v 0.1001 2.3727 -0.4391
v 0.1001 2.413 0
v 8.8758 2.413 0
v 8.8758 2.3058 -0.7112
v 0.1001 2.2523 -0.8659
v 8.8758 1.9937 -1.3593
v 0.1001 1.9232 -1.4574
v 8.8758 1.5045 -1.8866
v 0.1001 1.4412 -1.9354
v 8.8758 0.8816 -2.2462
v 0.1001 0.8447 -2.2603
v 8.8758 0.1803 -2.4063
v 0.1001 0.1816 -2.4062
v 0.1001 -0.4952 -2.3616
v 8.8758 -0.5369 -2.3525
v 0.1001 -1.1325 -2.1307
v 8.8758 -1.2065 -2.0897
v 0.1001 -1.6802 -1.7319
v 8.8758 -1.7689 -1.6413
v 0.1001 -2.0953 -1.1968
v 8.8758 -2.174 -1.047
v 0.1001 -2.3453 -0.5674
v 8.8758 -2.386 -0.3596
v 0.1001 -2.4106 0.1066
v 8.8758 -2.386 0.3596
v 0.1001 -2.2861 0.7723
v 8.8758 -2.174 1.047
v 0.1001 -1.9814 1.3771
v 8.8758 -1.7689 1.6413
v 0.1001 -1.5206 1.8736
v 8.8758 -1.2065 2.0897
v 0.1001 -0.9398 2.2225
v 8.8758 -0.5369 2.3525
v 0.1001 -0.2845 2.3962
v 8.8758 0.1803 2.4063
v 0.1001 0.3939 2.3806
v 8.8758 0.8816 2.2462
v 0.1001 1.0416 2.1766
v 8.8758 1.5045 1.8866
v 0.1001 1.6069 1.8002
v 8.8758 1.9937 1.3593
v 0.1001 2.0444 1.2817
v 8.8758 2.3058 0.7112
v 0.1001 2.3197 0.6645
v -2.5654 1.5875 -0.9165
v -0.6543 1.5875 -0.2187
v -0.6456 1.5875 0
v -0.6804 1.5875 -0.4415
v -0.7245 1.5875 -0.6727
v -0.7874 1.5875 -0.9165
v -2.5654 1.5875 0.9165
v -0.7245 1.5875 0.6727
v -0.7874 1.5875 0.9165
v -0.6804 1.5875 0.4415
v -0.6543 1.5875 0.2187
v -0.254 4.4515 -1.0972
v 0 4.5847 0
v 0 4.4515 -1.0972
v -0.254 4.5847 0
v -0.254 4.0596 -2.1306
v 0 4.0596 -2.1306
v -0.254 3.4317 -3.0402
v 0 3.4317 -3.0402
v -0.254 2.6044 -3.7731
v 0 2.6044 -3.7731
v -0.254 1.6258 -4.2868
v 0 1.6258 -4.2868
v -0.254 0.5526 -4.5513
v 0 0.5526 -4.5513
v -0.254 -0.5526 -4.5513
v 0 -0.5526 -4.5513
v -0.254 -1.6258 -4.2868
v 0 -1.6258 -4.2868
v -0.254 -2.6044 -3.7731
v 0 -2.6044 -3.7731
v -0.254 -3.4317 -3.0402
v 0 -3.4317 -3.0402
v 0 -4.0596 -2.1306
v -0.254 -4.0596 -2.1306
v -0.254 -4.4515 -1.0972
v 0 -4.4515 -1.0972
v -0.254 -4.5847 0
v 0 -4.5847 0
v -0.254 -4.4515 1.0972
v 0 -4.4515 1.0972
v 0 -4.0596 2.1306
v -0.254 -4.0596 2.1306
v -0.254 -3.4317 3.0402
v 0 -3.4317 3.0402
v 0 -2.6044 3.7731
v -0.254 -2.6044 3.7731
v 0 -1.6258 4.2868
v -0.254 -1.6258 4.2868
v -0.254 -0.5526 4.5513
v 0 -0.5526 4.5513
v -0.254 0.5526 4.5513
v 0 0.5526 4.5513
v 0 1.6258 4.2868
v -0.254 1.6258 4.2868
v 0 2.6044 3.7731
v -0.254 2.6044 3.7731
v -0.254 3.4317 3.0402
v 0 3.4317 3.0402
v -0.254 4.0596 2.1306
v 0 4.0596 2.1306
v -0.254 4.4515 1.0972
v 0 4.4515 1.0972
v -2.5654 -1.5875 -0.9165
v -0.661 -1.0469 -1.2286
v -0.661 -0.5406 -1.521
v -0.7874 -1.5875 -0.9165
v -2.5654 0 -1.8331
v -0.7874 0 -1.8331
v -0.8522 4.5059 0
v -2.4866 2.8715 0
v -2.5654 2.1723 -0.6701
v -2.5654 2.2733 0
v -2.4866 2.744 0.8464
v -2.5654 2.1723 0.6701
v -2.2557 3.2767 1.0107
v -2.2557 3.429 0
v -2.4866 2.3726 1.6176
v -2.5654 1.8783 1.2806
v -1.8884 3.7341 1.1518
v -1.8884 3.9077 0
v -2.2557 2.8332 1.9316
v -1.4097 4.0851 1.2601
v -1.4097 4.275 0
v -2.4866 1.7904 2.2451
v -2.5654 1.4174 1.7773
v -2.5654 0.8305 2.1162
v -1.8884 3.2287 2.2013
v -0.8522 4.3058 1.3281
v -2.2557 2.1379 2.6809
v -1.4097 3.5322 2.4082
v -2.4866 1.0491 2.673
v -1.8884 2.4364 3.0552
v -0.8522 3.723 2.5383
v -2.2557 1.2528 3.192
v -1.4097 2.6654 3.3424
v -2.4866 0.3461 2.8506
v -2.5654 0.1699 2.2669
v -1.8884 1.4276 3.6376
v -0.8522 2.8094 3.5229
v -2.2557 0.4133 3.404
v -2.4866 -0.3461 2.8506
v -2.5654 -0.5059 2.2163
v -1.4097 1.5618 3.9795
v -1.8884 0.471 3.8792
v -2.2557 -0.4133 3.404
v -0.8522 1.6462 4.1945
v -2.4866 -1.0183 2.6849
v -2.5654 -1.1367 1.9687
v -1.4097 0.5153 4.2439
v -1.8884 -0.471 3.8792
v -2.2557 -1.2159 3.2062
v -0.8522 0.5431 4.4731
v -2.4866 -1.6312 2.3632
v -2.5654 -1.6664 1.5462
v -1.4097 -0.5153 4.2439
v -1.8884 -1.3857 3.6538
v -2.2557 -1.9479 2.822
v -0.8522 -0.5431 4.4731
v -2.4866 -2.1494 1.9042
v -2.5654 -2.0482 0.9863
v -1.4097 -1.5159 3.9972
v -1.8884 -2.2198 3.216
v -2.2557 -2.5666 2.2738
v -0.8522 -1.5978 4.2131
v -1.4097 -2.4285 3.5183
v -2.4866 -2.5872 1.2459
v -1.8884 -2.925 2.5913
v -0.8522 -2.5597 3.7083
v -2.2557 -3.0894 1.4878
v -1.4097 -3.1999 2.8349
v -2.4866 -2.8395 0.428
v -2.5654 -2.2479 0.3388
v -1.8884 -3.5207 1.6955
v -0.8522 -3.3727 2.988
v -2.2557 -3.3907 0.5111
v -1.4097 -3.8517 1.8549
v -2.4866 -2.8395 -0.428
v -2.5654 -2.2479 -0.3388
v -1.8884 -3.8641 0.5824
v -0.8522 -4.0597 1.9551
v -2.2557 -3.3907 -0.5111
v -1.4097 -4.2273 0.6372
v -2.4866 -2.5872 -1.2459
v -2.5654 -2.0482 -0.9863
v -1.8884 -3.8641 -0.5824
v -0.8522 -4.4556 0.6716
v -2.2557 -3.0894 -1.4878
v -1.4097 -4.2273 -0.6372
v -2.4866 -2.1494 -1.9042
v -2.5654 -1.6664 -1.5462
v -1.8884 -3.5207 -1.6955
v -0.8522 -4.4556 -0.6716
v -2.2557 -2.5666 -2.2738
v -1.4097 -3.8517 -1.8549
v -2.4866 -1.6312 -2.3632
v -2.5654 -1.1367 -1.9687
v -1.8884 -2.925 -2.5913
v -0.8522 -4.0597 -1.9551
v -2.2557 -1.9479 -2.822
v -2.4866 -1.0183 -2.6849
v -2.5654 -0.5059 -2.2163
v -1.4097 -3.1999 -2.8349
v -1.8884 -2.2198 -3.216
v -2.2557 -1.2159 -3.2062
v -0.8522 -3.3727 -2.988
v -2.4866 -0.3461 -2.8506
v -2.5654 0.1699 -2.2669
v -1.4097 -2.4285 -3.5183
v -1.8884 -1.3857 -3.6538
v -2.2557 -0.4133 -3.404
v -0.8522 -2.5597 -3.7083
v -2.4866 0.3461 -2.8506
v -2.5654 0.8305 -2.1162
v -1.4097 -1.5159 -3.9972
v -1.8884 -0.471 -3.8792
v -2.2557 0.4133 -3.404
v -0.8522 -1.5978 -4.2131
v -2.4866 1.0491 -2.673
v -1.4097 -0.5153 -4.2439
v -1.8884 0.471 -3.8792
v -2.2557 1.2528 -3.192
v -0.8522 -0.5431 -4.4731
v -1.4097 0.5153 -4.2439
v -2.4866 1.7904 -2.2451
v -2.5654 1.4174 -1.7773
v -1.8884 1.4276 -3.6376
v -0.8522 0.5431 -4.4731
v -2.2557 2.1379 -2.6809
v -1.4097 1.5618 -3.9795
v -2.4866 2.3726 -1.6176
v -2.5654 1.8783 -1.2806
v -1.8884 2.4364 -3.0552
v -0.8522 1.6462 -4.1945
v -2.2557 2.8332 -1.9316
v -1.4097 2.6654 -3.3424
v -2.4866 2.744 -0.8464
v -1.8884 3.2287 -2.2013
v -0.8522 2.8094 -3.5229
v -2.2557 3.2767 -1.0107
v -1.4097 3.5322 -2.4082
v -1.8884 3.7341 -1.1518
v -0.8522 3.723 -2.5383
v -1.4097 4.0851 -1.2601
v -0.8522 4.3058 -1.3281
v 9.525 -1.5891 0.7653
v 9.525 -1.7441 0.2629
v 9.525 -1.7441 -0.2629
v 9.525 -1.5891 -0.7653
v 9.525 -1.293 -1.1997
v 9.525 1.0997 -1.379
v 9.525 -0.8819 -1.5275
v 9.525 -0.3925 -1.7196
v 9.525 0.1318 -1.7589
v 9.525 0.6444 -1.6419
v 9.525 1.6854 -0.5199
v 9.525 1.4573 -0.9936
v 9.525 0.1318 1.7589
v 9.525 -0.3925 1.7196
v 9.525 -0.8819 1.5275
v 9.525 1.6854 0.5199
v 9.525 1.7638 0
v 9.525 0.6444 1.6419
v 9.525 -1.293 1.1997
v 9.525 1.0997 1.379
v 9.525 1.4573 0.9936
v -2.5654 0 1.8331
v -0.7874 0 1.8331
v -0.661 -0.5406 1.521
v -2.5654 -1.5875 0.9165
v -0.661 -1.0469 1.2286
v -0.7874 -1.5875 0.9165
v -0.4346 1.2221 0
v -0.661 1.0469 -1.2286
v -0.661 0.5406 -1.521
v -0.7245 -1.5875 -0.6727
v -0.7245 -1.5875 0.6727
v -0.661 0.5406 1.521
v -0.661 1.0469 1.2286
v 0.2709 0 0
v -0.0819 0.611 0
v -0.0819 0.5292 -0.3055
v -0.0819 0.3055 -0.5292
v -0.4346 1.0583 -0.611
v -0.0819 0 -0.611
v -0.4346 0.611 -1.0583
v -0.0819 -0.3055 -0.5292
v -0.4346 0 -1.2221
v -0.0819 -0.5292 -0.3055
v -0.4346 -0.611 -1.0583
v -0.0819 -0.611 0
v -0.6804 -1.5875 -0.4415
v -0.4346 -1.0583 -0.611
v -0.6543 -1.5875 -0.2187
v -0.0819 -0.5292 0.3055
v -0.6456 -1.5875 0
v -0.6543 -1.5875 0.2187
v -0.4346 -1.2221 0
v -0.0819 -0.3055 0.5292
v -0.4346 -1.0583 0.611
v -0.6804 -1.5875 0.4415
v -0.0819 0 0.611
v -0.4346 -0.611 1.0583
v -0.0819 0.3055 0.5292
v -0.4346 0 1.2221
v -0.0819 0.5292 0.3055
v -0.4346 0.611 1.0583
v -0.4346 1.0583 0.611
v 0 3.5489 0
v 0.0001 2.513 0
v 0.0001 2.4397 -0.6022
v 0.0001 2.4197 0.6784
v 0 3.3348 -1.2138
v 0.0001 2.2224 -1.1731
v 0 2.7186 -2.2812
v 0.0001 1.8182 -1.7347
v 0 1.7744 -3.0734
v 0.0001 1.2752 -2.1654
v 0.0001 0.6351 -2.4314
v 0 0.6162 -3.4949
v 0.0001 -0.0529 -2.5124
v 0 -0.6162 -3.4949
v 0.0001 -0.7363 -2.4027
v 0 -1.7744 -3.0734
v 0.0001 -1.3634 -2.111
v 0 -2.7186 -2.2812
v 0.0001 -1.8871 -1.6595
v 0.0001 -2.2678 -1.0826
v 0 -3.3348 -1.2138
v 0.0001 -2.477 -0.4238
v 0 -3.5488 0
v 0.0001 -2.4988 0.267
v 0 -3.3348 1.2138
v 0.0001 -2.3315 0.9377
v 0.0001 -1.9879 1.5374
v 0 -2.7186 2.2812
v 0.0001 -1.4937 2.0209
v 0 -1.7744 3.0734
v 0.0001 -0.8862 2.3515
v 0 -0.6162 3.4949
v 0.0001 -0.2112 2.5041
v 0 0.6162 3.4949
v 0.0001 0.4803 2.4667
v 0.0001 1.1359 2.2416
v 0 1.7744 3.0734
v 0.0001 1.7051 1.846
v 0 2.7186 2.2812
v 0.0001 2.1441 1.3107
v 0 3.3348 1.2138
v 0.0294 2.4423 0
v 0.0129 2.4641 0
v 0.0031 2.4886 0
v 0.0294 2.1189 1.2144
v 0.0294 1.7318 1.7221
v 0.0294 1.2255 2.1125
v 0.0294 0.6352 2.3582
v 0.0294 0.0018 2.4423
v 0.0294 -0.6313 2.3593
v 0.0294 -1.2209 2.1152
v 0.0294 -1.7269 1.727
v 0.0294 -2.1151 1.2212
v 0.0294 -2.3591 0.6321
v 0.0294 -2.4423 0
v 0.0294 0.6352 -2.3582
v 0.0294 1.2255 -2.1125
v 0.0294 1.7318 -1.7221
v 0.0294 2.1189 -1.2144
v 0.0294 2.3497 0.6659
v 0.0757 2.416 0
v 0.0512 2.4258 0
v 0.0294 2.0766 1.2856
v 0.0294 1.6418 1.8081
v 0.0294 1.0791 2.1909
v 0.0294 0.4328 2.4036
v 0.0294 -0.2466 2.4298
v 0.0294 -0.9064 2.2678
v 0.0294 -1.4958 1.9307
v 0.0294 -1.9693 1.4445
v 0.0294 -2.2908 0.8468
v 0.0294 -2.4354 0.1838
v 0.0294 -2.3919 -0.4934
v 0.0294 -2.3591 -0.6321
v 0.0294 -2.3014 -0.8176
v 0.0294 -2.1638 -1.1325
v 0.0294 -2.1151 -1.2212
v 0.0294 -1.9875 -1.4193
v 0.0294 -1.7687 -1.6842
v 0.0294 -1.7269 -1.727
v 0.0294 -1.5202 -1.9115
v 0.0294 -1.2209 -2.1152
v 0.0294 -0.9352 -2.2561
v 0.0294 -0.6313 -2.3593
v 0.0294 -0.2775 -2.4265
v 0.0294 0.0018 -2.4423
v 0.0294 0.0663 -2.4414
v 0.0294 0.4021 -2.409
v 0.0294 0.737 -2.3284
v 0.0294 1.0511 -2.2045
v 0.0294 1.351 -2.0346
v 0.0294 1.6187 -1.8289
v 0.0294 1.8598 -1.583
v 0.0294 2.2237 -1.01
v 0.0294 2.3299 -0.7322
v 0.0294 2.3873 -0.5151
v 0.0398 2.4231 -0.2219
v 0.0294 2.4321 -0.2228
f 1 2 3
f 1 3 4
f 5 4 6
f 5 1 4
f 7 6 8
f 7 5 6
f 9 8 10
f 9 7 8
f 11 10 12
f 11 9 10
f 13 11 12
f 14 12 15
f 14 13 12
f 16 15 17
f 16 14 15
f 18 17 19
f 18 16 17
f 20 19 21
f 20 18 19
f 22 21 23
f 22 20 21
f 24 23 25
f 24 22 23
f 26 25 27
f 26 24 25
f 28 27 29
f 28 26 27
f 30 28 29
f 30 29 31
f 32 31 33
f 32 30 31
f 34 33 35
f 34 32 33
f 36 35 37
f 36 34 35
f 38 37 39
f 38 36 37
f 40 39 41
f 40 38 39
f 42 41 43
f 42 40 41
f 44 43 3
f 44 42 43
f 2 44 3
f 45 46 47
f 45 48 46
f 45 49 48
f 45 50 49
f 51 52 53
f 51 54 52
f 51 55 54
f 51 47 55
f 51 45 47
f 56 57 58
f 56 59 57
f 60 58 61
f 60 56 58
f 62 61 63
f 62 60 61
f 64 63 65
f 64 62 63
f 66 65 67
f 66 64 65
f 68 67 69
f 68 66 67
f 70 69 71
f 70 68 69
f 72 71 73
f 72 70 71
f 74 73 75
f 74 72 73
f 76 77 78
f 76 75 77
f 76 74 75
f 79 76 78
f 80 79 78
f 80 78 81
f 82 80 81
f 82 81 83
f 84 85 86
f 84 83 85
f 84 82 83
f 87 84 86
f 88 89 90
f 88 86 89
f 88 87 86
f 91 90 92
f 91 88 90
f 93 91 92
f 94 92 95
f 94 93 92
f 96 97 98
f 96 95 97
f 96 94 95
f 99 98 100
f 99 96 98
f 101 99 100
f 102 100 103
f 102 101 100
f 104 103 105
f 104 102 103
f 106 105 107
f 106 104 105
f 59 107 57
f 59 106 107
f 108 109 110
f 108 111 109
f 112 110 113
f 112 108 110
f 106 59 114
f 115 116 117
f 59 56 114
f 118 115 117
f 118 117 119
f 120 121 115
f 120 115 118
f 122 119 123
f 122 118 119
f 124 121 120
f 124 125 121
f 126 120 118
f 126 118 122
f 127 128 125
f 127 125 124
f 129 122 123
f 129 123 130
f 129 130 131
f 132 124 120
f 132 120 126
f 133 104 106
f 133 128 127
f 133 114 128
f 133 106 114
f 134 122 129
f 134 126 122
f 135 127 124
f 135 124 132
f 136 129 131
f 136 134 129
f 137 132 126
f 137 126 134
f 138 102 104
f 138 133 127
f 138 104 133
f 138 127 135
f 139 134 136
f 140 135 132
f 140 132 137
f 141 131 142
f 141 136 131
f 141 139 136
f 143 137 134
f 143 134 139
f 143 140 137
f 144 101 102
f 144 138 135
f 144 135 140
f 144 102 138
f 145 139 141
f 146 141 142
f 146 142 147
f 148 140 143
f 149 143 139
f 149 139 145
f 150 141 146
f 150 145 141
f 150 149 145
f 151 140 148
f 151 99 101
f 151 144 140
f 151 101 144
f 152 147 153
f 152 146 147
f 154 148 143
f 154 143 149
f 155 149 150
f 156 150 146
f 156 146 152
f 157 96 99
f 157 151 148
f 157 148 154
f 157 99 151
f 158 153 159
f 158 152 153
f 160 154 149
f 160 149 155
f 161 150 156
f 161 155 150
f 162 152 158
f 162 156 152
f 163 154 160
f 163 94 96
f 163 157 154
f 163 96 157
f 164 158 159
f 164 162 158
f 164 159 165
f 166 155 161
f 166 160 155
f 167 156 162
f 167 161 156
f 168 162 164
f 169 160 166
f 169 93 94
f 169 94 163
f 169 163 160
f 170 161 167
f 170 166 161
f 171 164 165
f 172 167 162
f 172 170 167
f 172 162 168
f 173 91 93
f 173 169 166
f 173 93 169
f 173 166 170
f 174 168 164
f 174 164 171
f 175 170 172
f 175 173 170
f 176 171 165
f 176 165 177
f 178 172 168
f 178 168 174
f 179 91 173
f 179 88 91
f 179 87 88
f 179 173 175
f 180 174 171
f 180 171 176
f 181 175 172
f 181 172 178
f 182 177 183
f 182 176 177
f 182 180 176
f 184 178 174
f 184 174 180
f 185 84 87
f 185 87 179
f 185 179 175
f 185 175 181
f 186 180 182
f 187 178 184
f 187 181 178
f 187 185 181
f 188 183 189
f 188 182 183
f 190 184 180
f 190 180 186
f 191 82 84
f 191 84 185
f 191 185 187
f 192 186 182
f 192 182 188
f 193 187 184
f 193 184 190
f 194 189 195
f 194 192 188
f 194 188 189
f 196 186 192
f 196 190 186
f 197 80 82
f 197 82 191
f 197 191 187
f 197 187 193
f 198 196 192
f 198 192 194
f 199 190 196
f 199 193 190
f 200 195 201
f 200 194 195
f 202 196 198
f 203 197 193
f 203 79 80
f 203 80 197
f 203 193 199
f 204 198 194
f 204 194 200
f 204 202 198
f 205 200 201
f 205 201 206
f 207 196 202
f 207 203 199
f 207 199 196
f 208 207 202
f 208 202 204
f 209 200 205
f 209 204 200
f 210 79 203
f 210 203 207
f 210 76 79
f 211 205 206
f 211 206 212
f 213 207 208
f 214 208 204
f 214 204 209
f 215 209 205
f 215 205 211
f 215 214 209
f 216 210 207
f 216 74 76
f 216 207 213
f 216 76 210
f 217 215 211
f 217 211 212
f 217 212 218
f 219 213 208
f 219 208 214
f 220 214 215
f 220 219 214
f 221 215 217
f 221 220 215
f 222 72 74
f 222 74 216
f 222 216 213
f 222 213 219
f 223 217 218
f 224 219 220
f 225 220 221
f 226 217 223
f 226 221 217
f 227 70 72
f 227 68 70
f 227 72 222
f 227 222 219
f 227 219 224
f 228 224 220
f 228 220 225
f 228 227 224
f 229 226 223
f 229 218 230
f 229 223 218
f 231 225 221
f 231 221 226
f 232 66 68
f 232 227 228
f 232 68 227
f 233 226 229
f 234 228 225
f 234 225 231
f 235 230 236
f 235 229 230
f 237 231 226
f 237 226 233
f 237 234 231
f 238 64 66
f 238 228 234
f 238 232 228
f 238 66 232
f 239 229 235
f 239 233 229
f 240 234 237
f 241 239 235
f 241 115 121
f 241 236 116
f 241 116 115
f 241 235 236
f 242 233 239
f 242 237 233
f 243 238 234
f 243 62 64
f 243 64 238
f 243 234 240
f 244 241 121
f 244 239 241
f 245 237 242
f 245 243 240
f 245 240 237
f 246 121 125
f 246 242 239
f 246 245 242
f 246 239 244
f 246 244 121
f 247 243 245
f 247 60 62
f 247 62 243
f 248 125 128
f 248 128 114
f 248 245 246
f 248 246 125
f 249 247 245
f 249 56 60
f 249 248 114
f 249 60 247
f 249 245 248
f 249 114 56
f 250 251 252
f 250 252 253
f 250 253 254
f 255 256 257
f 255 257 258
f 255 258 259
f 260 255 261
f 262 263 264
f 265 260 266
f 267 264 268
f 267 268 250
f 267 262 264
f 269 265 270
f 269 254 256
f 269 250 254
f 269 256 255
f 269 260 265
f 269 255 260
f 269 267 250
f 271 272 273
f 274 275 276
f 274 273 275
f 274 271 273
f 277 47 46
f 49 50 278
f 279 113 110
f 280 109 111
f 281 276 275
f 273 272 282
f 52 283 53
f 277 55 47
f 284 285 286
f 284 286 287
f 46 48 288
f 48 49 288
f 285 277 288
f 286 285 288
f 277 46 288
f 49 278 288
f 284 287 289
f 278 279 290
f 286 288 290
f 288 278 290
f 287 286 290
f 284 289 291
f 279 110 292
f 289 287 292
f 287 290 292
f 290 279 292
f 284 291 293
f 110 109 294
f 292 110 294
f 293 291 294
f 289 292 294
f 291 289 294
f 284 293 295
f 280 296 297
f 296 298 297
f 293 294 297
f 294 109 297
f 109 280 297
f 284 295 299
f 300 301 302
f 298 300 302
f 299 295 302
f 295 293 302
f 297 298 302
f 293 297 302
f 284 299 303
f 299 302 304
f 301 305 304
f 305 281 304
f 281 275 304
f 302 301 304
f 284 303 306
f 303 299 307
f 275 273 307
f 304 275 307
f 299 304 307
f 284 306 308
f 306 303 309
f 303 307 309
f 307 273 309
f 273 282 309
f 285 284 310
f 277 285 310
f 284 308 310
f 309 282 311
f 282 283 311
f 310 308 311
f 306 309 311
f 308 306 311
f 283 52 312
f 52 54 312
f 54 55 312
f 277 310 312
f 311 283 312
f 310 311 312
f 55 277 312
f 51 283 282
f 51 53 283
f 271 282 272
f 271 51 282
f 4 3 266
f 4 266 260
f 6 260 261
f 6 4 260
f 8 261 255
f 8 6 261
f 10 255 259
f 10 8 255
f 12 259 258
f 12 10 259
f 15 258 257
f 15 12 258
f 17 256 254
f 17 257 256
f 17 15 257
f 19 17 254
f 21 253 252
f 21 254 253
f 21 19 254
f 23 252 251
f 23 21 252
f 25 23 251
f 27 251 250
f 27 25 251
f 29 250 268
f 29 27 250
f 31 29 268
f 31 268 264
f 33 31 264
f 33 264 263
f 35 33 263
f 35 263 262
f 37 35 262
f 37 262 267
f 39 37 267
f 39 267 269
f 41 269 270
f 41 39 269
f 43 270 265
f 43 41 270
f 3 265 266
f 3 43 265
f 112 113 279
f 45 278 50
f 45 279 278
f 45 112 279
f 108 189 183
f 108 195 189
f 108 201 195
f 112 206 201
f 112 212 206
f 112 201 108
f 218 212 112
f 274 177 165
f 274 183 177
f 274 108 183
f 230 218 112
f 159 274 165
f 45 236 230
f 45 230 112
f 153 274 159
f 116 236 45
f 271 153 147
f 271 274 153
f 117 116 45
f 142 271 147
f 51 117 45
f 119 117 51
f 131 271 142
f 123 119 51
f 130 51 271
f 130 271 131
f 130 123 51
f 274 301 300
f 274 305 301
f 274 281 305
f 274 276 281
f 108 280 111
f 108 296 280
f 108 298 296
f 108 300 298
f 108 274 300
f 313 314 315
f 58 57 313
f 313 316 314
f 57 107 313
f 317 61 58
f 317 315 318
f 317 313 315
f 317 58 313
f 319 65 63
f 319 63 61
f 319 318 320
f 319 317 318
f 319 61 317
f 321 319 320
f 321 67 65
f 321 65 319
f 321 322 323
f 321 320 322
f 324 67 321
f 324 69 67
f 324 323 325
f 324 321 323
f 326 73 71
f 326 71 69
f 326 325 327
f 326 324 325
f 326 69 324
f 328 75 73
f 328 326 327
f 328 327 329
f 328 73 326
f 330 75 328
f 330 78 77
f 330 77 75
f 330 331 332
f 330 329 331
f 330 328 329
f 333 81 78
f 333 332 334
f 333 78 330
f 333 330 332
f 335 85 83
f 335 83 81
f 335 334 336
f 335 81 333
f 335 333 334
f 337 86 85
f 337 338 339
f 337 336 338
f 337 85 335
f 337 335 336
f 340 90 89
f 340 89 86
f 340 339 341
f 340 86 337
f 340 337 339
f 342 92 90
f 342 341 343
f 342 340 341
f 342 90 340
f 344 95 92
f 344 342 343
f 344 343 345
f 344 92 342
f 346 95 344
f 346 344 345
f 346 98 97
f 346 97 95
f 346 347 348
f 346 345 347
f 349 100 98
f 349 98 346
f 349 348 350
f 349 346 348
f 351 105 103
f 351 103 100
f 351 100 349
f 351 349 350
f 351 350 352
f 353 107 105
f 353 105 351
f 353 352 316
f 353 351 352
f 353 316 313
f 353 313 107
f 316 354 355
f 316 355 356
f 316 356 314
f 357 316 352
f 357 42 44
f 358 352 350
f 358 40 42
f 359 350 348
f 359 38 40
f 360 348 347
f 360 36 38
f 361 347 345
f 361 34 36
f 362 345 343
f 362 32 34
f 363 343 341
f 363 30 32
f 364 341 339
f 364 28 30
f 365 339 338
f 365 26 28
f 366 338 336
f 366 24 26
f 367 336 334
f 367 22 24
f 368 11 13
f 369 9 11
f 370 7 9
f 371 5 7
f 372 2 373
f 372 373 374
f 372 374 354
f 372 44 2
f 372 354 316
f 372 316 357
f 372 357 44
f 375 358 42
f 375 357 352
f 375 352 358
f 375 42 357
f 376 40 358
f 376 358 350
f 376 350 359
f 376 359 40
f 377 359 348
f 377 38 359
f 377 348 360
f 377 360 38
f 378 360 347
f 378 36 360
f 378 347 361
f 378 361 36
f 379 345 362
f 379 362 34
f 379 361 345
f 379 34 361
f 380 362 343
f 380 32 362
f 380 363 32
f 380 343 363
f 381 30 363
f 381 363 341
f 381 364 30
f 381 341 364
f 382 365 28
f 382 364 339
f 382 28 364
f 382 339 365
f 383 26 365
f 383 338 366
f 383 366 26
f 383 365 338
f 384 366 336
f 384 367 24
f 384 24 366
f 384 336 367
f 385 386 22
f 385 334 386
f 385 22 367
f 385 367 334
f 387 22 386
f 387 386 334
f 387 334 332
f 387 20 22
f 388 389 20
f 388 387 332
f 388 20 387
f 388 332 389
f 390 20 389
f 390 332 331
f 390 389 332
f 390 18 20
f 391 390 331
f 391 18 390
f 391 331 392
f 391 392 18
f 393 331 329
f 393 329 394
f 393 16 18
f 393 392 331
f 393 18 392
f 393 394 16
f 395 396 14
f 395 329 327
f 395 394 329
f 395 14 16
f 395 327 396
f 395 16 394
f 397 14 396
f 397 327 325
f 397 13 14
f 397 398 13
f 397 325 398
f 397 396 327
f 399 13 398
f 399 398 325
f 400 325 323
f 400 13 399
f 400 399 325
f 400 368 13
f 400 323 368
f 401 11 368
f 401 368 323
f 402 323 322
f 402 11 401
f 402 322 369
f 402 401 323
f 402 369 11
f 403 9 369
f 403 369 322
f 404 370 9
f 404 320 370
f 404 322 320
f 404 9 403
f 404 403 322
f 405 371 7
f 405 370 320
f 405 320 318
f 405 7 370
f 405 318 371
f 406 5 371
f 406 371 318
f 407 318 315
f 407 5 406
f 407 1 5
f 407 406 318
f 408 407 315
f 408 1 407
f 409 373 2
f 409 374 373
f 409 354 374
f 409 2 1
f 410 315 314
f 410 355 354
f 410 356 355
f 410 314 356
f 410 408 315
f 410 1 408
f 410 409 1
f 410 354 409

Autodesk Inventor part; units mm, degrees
ref_plane "YZ Plane" through (0, 0, 0) normal (1, 0, 0) x (0, 1, 0)
ref_plane "XZ Plane" through (0, 0, 0) normal (0, 1, 0) x (-1, 0, 0)
sketch "Sketch1" plane through (0, 0, 0) normal (0, 0, 1) x (1, 0, 0)
  line L0 (0.2709, 0) -> (9.525, 0)
  line L1 (9.525, 0) -> (9.525, 2.413)
  line L2 (9.525, 2.413) -> (2.1084, 2.413)
  line L3 (2.1084, 2.413) -> (0.0001, 2.413)
  line L4 (0.0001, 2.413) -> (0, 2.413)
  line L5 (0, 2.413) -> (0, 4.5847)
  line L6 (0, 4.5847) -> (-2.5654, 4.5847)
  line L7 (-2.5654, 4.5847) -> (-2.5654, 1.8331)
  line L8 (-2.5654, 1.8331) -> (-0.7874, 1.8331)
  line L9 (-0.7874, 1.8331) -> (0.2709, 0)
  line L10 (-4.9835, 0) -> (11.9431, 0) projected
  line L11 (0, -0.9169) -> (0, 5.5016) projected
  line L12 (2.1084, 2.413) -> (0, 2.413) construction
  dimension "d1" = 7.4166
  dimension "d2" = 2.1083
  dimension "d3" = 2.5654
  dimension "d4" = 1.778
  dimension "d5" = 60
  dimension "d6" = 4.826
  dimension "d7" = 4.826
  dimension "d8" = 3.6662
  dimension "d9" = 9.1694
  dimension "d26" = 9.525
revolve "Body" add sketch "Sketch1" angle 360 about axis through (0.2709, 0, 0) along (1, 0, 0) contours L9 L11 L3 L2 L1 L0 | L9 L8 L7 L6 L5 L11
sketch "Sketch2" plane through (-2.5654, 0, 0) normal (-1, 0, 0) x (0, 0, 1)
  circle A0 centre (0, 0) radius 1.8331 projected
  line L0 (0, -6.4186) -> (0, 6.4186) projected
  line L1 (-6.4186, 0) -> (6.4186, 0) projected
  line L2 (1.8331, 0) -> (0.9165, -1.5875)
  line L3 (0.9165, -1.5875) -> (-0.9165, -1.5875)
  line L4 (-0.9165, -1.5875) -> (-1.8331, 0)
  line L5 (-1.8331, 0) -> (-0.9165, 1.5875)
  line L6 (-0.9165, 1.5875) -> (0.9165, 1.5875)
  line L7 (0.9165, 1.5875) -> (1.8331, 0)
  point P0 (0, 0)
extrude "Slot" add sketch "Sketch2" against normal up to next contours L7 A0 | A0 L2 | L6 L0 A0 | A0 L0 L3 | L0 L6 A0 | A0 L3 L0 | L4 A0 | A0 L5
fillet "Fillet1" radius 2.3114 1 edges at (-2.5654, -4.5847, 0)
thread "Thread" size "10-24 UNC" class "2A" standard "ANSI Unified Screw Threads" length 7.4166
chamfer "Chamfer1" distance 0.6492 distance2 0.6492 1 edges at (9.525, -2.413, 0) measured on face at (9.525, -0.2686, 0.7084)
ref_plane "Work Plane1" through (29, 0, 0) normal (0, -1, 0) x (1, 0, 0)
fillet "Fillet2" radius 0.1 1 edges at (0.0001, -2.413, 0)
equation "\"d1\" = GEL"
equation "\"d3\" = KOH"
equation "\"d4\" = INTI"
equation "\"d6\" = GD"
equation "\"d7\" = BDM"
equation "\"d8\" = 1.1547 * SW"
equation "\"d9\" = KOD"
equation "\"d26\" = NLG"
equation "\"d30\" = R"
equation "\"d17\" = RR"
equation "\"d13\" = GEL"
equation "\"d15\" = -0.5 * SPD + 0.5 * GD"
equation "\"d16\" = GUL"
equation "\"GD\" = NND"
equation "\"NLG\" = 9.525"
equation "\"GEL\" = 7.4166"
equation "\"KOD\" = 9.1694"
equation "\"KOH\" = 2.5654"
equation "\"INTI\" = 1.778"
equation "\"GAL\" = 2.1082"
equation "\"GUL\" = 0.64922"
equation "\"BDM\" = NND"
equation "\"SW\" = 3.175"
equation "\"RR\" = 2.3114"
equation "\"SPD\" = 3.52755"
equation "\"R\" = 0.1"
equation "\"TOA\" = 30deg"
equation "\"GD1\" = SPD"
equation "\"THREADDIA\" = 4.826"
equation "\"KOH1\" = 0.508"
equation "\"NND\" = 4.826"
equation "\"E0\" = 3.66725"
properties part number "ANSI B18.3 - 10 - 24 x 3/8" material "Steel, Mild"
